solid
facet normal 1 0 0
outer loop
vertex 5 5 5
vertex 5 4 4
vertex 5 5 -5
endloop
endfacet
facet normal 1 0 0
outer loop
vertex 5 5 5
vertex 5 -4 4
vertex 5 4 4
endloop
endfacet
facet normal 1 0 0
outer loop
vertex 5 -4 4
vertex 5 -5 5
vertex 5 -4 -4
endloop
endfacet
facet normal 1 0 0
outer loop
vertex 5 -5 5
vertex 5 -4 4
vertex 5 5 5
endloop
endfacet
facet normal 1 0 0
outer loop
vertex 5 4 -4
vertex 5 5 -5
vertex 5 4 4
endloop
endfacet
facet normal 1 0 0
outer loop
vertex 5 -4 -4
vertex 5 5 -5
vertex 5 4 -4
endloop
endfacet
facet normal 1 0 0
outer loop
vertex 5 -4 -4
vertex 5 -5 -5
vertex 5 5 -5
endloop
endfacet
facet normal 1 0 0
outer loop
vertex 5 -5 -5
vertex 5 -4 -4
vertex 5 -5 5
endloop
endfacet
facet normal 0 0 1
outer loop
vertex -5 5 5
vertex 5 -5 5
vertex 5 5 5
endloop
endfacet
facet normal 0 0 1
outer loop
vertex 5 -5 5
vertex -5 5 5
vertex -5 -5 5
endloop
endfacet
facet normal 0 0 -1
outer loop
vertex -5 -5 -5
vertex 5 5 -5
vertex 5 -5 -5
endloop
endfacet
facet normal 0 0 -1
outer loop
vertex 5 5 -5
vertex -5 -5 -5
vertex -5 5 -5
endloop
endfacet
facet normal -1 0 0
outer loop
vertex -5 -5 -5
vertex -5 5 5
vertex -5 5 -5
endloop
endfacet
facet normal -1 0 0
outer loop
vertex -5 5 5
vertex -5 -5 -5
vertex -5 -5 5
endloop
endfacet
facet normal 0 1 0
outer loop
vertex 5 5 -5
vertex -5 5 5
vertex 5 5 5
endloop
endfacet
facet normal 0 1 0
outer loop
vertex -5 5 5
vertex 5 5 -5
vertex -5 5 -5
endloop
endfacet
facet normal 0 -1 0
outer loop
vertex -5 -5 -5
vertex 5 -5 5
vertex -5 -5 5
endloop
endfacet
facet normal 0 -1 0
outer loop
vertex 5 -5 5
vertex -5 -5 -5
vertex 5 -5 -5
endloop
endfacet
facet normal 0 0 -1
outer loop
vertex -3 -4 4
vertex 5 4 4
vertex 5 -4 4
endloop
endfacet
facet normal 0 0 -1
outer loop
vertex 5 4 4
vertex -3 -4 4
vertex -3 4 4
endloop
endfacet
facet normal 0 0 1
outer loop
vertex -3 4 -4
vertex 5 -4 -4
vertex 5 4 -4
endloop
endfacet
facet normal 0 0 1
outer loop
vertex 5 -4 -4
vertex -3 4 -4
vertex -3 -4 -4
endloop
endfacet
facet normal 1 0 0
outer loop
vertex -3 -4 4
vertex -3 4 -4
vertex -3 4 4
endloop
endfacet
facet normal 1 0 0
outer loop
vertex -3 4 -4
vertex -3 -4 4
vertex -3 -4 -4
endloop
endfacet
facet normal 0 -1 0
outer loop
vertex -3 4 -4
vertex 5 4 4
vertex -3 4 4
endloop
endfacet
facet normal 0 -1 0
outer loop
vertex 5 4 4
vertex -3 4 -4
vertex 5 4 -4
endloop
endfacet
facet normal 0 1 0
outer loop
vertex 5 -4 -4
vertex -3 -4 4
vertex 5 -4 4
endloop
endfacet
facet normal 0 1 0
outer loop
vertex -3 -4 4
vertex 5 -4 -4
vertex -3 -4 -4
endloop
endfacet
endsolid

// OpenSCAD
difference() {
		cube(size=[10,10,10],center=true);
		translate([1,0,0]) {cube(size=[8,8,8],center=true);}
}

	
